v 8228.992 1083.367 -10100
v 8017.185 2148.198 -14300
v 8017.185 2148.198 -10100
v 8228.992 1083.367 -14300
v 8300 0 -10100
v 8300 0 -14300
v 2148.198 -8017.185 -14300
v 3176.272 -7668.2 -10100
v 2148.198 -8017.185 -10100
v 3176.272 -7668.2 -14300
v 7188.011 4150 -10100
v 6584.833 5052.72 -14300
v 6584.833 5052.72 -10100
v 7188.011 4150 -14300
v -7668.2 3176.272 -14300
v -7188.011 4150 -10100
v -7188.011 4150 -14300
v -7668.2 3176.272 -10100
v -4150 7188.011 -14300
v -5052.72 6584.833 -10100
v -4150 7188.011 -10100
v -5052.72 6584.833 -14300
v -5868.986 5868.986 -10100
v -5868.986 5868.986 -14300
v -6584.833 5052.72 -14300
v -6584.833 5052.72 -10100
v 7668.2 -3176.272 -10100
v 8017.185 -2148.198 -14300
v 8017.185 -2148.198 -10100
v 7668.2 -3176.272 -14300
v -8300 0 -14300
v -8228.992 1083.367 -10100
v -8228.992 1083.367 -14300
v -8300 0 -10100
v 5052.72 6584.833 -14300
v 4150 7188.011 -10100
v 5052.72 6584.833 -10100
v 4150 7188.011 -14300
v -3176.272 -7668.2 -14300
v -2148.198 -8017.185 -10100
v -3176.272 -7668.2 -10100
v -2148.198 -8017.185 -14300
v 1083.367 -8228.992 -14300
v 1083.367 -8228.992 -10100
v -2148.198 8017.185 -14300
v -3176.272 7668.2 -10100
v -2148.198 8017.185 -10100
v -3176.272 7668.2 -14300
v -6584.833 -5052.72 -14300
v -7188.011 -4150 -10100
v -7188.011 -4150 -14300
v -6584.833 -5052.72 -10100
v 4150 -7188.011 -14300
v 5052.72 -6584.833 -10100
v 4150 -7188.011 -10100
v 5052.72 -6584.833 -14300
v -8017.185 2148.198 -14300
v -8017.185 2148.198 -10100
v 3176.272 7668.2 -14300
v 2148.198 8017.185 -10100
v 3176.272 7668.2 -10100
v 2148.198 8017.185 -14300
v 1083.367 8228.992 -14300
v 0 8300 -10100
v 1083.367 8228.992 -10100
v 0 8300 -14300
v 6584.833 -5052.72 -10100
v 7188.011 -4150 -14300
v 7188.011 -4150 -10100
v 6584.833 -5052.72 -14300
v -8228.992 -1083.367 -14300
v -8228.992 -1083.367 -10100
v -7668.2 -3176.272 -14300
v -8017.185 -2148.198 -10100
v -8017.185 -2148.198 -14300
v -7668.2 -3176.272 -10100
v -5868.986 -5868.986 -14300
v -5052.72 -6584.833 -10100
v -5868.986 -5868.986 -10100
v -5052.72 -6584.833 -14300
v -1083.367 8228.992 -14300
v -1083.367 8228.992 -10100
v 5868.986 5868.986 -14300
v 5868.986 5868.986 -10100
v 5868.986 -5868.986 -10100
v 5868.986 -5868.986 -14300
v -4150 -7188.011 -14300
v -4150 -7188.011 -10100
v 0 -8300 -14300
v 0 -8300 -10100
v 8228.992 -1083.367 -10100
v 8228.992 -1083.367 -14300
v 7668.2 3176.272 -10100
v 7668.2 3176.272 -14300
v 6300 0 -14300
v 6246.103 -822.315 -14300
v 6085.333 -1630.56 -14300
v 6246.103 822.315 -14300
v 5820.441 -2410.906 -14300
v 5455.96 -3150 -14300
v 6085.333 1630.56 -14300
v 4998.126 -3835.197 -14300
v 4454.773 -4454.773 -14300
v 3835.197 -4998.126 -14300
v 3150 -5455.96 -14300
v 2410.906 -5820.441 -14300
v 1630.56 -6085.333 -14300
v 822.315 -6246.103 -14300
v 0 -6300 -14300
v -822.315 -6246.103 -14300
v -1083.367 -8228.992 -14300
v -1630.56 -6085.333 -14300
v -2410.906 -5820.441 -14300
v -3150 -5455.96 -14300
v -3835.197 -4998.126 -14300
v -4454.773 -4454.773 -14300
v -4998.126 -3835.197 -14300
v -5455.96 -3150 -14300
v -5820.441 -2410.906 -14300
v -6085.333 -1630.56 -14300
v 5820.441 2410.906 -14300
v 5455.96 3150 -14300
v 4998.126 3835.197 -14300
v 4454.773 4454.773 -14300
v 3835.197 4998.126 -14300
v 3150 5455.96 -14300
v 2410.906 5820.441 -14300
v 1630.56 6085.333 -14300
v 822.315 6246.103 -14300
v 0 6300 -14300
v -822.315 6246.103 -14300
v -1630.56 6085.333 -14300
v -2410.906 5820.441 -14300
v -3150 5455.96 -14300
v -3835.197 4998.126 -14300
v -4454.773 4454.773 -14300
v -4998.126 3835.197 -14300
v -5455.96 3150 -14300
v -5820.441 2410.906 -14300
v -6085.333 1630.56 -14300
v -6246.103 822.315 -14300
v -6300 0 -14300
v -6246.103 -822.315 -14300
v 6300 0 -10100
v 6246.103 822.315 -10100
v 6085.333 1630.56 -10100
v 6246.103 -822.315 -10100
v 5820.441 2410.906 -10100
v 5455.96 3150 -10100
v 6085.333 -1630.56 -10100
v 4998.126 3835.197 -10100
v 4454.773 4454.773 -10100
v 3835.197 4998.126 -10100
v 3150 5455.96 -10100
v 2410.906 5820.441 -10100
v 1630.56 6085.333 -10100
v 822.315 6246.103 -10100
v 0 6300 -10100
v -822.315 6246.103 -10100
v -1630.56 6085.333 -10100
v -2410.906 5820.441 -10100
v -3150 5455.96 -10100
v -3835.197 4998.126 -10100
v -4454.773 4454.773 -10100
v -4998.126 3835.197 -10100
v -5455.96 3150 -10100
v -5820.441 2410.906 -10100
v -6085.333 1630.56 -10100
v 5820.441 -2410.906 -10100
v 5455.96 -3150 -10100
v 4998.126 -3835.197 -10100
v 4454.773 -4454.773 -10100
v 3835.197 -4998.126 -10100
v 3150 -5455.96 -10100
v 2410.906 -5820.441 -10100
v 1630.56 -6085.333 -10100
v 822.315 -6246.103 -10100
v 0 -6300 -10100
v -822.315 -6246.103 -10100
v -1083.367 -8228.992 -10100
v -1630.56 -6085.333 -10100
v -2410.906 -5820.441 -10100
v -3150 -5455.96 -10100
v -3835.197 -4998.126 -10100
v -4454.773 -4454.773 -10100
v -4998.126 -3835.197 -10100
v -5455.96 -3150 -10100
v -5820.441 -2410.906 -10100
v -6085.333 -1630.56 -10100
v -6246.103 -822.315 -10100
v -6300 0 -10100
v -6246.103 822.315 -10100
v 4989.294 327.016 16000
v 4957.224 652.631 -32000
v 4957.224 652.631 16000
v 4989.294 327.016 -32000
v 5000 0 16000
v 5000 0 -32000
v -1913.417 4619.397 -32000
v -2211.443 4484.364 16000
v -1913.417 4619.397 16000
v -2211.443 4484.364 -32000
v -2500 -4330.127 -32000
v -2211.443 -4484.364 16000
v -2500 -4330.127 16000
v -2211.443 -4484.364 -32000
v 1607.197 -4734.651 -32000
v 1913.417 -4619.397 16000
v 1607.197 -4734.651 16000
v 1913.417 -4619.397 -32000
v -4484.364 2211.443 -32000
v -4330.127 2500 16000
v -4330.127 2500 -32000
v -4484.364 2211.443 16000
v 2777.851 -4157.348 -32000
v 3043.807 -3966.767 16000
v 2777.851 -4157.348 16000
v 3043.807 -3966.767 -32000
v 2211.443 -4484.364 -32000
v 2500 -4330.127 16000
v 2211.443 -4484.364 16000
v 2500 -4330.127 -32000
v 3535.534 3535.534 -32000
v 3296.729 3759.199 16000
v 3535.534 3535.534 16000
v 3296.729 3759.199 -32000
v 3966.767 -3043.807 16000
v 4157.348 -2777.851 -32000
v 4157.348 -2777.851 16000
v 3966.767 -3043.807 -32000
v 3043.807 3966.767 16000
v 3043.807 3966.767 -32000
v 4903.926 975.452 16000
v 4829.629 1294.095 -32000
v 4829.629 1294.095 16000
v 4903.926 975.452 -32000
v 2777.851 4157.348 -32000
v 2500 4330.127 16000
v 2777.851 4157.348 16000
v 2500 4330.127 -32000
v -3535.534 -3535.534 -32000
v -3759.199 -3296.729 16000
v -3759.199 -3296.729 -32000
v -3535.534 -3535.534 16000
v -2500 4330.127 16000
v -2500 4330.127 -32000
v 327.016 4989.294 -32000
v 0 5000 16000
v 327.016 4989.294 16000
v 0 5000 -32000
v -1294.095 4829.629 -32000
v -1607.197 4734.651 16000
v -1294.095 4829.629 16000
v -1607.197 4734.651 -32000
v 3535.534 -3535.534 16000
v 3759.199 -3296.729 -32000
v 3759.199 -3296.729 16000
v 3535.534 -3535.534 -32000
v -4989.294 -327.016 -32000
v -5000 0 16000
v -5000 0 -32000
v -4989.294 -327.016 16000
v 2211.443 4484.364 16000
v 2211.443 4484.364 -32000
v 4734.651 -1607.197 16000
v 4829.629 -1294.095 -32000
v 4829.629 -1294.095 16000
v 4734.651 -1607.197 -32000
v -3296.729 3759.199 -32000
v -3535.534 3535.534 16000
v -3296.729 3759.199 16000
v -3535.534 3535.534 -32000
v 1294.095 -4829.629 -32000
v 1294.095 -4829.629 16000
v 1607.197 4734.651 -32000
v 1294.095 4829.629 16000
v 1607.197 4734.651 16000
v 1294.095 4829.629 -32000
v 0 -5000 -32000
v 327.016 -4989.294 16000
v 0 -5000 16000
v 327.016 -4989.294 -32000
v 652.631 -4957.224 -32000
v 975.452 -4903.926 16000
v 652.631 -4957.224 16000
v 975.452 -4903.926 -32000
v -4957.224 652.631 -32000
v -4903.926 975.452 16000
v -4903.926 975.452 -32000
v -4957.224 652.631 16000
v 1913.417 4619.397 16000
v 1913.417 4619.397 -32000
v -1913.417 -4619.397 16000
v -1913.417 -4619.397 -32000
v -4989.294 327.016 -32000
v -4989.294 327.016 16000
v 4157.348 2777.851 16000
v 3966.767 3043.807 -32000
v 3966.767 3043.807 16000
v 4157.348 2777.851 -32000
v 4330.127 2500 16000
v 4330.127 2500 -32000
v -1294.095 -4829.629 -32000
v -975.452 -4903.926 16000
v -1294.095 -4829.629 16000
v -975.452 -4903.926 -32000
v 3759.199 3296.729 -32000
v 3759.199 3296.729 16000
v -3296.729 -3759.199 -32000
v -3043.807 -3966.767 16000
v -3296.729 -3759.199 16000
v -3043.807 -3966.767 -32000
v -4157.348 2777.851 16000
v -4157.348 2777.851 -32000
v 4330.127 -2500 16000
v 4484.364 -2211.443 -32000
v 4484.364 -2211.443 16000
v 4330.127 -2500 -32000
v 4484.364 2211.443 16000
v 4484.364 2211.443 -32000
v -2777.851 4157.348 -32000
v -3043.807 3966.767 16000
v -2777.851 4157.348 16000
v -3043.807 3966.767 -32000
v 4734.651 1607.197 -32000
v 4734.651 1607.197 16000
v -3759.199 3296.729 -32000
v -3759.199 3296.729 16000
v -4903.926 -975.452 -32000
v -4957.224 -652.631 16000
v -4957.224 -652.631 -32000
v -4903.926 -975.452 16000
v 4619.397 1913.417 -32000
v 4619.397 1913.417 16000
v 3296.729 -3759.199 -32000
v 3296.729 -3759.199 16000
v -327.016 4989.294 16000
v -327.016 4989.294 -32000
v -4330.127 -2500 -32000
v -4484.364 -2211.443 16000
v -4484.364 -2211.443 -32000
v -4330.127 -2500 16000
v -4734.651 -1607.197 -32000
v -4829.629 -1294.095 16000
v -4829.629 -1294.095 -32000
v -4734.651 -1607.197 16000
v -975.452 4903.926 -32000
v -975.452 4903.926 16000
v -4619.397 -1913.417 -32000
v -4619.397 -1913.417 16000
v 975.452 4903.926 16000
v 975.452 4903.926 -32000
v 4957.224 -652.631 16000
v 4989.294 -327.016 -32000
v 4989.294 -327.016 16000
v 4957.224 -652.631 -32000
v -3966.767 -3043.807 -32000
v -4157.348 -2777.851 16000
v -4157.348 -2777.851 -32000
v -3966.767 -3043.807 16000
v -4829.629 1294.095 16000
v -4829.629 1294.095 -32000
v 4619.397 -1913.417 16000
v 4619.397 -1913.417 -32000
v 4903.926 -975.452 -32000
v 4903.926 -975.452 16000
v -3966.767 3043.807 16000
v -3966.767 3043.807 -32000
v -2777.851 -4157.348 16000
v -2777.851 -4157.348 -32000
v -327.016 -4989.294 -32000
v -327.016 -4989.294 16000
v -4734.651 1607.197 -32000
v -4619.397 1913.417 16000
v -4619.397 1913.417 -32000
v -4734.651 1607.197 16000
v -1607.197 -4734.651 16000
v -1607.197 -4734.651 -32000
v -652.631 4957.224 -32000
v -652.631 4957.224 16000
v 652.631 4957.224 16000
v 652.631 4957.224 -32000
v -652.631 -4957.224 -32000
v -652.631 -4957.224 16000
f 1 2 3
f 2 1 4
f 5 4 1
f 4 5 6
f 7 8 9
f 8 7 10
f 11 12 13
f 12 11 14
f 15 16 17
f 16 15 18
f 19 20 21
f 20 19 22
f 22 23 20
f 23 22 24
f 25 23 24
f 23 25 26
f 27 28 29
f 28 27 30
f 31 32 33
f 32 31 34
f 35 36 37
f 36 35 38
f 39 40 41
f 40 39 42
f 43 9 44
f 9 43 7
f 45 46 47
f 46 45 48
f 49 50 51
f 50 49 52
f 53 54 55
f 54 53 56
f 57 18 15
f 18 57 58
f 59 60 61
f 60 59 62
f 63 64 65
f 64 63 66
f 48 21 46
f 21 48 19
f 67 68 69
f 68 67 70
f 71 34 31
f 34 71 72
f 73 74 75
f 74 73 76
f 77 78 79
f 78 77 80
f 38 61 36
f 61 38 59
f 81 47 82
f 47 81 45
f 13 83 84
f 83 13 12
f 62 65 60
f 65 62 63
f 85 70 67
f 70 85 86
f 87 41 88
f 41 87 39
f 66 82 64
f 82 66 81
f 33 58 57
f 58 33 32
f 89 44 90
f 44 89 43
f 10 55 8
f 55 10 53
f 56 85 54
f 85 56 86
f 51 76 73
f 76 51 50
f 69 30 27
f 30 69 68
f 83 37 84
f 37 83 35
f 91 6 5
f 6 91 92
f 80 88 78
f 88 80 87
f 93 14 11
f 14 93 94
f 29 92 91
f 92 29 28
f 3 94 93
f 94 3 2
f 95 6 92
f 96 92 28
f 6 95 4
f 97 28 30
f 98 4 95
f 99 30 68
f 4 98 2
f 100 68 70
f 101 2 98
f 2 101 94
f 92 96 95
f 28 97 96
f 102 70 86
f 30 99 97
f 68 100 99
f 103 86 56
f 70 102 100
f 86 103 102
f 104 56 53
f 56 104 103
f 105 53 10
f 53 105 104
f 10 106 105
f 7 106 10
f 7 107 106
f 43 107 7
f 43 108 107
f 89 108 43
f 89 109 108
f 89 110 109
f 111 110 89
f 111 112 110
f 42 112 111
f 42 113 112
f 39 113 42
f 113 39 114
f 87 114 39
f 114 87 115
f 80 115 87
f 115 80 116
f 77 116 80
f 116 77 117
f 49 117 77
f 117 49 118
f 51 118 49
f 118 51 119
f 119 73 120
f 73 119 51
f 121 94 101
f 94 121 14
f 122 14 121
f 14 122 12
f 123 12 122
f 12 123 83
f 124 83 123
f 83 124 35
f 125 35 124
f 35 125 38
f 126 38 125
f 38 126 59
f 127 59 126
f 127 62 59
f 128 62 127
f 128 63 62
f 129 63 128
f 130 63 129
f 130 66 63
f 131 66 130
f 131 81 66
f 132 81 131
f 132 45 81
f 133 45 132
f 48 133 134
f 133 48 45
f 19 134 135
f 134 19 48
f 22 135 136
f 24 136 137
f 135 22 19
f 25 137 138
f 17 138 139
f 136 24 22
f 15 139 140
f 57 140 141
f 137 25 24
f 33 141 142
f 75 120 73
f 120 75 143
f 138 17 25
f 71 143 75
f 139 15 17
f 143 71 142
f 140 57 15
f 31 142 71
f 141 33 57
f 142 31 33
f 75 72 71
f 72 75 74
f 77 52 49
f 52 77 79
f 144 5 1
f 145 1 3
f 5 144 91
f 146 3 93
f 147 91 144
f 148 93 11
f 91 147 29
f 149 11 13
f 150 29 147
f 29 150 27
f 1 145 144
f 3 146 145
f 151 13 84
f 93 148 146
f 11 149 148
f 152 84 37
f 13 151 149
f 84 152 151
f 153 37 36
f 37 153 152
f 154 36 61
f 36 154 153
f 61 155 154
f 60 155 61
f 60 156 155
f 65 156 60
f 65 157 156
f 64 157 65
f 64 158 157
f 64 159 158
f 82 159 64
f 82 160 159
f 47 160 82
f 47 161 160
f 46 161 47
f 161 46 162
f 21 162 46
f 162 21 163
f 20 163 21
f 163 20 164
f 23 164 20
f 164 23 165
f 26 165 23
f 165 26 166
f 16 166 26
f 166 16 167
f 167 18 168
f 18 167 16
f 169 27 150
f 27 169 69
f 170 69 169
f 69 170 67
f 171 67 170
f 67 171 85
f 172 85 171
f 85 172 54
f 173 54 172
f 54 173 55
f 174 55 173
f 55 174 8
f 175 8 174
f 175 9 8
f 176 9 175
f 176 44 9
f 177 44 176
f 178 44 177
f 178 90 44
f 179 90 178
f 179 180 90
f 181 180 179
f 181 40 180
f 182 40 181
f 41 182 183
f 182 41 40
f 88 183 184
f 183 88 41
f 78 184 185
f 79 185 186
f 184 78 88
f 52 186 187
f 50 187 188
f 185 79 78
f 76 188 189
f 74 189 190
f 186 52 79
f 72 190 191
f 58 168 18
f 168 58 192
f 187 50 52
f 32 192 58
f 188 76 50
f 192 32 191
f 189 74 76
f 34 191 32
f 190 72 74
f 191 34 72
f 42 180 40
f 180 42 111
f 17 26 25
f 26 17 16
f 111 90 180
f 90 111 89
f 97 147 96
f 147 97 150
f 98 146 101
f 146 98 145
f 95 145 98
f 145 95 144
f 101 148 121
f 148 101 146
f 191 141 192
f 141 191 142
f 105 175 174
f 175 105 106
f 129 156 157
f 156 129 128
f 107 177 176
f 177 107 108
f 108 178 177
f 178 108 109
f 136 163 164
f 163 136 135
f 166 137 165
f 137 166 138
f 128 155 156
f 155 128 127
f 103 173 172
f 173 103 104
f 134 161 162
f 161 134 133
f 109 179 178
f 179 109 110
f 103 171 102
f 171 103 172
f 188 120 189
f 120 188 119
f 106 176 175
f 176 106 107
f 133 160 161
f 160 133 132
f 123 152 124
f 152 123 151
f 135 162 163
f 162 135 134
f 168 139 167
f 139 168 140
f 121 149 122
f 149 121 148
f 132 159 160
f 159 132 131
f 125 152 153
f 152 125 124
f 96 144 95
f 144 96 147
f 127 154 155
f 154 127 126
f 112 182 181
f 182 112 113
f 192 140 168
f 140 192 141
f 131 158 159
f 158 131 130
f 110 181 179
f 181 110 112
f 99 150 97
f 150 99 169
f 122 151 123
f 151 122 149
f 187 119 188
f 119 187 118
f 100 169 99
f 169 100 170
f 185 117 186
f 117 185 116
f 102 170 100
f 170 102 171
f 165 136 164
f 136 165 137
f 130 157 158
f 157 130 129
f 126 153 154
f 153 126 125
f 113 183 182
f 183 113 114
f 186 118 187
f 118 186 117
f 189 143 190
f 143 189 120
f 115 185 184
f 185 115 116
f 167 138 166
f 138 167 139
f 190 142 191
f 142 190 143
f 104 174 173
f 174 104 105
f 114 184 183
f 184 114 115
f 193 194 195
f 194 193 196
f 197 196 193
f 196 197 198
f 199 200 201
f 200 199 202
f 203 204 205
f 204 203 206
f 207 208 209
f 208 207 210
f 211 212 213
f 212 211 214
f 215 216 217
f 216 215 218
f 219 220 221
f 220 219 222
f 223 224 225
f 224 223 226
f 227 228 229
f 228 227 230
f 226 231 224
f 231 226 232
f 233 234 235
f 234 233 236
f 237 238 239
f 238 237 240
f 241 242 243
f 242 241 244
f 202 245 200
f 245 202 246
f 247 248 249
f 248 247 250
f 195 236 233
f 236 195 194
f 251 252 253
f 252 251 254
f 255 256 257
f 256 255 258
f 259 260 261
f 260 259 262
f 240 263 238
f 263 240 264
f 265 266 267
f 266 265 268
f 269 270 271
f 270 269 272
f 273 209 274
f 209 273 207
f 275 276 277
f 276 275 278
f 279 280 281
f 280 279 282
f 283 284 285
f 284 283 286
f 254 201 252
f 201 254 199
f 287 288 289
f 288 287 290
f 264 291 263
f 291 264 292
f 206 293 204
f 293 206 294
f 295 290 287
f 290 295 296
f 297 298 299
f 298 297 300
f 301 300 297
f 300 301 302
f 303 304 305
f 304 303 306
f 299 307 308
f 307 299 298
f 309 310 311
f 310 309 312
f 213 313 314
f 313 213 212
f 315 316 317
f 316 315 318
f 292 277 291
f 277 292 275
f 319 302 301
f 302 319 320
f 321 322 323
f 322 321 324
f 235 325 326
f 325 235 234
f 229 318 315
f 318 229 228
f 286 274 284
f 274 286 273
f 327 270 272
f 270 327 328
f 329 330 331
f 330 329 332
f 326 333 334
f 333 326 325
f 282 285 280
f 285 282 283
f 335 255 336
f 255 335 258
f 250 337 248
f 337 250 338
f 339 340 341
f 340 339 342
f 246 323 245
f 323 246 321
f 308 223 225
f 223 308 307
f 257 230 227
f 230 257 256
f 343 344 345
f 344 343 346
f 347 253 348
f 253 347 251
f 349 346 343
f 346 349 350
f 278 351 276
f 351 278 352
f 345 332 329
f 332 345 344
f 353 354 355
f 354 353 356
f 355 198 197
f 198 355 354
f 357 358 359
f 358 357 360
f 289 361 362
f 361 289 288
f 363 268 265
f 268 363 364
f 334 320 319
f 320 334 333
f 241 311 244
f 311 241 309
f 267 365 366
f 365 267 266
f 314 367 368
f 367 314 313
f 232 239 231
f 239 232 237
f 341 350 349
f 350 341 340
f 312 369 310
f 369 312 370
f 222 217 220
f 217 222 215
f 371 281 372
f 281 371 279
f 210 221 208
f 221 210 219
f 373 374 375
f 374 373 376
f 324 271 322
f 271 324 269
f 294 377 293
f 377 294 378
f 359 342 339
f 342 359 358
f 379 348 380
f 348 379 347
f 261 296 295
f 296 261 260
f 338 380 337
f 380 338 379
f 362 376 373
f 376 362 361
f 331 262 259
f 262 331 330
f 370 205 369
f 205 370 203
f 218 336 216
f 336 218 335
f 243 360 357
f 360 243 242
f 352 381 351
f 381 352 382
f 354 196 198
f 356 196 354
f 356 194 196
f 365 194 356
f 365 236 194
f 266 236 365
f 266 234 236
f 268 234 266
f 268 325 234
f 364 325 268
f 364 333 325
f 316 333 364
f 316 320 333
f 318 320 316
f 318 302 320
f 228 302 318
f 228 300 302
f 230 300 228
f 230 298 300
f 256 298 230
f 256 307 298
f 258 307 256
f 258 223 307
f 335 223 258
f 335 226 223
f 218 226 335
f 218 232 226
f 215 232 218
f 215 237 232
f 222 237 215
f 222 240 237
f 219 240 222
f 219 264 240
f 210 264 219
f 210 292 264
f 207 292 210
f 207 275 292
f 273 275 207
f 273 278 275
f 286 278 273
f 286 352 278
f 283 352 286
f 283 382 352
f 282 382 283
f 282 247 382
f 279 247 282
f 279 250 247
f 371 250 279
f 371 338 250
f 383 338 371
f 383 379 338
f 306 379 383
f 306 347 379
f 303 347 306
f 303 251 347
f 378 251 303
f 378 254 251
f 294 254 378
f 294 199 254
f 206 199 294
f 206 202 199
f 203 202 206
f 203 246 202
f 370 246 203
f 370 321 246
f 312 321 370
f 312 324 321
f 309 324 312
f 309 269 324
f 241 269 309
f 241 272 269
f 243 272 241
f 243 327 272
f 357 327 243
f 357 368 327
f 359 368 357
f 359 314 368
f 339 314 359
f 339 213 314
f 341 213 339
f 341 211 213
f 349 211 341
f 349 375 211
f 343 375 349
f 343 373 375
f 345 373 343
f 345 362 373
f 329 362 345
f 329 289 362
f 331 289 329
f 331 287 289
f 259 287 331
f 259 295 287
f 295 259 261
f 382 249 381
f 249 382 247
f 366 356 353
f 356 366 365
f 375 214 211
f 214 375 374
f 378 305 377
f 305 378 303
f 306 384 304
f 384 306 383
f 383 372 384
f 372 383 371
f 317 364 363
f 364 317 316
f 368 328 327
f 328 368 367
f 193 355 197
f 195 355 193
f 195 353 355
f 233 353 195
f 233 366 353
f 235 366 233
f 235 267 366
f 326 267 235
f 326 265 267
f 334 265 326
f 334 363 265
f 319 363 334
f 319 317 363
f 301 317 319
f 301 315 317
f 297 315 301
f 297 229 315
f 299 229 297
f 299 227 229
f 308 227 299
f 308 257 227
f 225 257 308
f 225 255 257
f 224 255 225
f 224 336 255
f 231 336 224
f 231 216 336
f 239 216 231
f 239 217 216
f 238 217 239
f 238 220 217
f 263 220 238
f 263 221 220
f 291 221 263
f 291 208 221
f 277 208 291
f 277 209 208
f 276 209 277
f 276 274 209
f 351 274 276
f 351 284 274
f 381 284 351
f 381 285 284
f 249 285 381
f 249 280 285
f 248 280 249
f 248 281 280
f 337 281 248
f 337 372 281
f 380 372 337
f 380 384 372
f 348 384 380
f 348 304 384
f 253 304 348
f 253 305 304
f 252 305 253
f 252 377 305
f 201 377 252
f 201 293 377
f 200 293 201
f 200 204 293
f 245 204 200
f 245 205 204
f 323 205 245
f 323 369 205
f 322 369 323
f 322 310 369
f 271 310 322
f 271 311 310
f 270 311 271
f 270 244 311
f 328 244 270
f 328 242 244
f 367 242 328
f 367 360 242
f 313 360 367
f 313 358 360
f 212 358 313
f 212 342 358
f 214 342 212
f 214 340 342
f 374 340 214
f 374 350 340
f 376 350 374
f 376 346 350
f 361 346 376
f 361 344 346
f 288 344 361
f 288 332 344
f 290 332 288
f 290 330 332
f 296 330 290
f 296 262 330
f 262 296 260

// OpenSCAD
// 演示动画 ③：装配顺序（浮箱 → 防撞套筒+万向滚珠 → 张拉整体模块 → 弹力索张拉 → 外包柔性膜）
// 用法：openscad -o frames\as_%04d.png --animate 60 anim_assembly.scad
SET_FN = 48;
SET_COIL_SEG = 6;
include <anticollision_lib.scad>

$vpt = [0, 0, -2000];
$vpr = [62, 0, 25 + 25 * $t];   // 缓慢环视
$vpd = 150000;

A1 = is_undef(A1) ? 0.20 : A1;
A2 = is_undef(A2) ? 0.40 : A2;
A3 = is_undef(A3) ? 0.55 : A3;
A4 = is_undef(A4) ? 0.75 : A4;

step = $t < A1 ? 1 : ($t < A2 ? 2 : ($t < A3 ? 3 : ($t < A4 ? 4 : 5)));

assembly_stage(step);
